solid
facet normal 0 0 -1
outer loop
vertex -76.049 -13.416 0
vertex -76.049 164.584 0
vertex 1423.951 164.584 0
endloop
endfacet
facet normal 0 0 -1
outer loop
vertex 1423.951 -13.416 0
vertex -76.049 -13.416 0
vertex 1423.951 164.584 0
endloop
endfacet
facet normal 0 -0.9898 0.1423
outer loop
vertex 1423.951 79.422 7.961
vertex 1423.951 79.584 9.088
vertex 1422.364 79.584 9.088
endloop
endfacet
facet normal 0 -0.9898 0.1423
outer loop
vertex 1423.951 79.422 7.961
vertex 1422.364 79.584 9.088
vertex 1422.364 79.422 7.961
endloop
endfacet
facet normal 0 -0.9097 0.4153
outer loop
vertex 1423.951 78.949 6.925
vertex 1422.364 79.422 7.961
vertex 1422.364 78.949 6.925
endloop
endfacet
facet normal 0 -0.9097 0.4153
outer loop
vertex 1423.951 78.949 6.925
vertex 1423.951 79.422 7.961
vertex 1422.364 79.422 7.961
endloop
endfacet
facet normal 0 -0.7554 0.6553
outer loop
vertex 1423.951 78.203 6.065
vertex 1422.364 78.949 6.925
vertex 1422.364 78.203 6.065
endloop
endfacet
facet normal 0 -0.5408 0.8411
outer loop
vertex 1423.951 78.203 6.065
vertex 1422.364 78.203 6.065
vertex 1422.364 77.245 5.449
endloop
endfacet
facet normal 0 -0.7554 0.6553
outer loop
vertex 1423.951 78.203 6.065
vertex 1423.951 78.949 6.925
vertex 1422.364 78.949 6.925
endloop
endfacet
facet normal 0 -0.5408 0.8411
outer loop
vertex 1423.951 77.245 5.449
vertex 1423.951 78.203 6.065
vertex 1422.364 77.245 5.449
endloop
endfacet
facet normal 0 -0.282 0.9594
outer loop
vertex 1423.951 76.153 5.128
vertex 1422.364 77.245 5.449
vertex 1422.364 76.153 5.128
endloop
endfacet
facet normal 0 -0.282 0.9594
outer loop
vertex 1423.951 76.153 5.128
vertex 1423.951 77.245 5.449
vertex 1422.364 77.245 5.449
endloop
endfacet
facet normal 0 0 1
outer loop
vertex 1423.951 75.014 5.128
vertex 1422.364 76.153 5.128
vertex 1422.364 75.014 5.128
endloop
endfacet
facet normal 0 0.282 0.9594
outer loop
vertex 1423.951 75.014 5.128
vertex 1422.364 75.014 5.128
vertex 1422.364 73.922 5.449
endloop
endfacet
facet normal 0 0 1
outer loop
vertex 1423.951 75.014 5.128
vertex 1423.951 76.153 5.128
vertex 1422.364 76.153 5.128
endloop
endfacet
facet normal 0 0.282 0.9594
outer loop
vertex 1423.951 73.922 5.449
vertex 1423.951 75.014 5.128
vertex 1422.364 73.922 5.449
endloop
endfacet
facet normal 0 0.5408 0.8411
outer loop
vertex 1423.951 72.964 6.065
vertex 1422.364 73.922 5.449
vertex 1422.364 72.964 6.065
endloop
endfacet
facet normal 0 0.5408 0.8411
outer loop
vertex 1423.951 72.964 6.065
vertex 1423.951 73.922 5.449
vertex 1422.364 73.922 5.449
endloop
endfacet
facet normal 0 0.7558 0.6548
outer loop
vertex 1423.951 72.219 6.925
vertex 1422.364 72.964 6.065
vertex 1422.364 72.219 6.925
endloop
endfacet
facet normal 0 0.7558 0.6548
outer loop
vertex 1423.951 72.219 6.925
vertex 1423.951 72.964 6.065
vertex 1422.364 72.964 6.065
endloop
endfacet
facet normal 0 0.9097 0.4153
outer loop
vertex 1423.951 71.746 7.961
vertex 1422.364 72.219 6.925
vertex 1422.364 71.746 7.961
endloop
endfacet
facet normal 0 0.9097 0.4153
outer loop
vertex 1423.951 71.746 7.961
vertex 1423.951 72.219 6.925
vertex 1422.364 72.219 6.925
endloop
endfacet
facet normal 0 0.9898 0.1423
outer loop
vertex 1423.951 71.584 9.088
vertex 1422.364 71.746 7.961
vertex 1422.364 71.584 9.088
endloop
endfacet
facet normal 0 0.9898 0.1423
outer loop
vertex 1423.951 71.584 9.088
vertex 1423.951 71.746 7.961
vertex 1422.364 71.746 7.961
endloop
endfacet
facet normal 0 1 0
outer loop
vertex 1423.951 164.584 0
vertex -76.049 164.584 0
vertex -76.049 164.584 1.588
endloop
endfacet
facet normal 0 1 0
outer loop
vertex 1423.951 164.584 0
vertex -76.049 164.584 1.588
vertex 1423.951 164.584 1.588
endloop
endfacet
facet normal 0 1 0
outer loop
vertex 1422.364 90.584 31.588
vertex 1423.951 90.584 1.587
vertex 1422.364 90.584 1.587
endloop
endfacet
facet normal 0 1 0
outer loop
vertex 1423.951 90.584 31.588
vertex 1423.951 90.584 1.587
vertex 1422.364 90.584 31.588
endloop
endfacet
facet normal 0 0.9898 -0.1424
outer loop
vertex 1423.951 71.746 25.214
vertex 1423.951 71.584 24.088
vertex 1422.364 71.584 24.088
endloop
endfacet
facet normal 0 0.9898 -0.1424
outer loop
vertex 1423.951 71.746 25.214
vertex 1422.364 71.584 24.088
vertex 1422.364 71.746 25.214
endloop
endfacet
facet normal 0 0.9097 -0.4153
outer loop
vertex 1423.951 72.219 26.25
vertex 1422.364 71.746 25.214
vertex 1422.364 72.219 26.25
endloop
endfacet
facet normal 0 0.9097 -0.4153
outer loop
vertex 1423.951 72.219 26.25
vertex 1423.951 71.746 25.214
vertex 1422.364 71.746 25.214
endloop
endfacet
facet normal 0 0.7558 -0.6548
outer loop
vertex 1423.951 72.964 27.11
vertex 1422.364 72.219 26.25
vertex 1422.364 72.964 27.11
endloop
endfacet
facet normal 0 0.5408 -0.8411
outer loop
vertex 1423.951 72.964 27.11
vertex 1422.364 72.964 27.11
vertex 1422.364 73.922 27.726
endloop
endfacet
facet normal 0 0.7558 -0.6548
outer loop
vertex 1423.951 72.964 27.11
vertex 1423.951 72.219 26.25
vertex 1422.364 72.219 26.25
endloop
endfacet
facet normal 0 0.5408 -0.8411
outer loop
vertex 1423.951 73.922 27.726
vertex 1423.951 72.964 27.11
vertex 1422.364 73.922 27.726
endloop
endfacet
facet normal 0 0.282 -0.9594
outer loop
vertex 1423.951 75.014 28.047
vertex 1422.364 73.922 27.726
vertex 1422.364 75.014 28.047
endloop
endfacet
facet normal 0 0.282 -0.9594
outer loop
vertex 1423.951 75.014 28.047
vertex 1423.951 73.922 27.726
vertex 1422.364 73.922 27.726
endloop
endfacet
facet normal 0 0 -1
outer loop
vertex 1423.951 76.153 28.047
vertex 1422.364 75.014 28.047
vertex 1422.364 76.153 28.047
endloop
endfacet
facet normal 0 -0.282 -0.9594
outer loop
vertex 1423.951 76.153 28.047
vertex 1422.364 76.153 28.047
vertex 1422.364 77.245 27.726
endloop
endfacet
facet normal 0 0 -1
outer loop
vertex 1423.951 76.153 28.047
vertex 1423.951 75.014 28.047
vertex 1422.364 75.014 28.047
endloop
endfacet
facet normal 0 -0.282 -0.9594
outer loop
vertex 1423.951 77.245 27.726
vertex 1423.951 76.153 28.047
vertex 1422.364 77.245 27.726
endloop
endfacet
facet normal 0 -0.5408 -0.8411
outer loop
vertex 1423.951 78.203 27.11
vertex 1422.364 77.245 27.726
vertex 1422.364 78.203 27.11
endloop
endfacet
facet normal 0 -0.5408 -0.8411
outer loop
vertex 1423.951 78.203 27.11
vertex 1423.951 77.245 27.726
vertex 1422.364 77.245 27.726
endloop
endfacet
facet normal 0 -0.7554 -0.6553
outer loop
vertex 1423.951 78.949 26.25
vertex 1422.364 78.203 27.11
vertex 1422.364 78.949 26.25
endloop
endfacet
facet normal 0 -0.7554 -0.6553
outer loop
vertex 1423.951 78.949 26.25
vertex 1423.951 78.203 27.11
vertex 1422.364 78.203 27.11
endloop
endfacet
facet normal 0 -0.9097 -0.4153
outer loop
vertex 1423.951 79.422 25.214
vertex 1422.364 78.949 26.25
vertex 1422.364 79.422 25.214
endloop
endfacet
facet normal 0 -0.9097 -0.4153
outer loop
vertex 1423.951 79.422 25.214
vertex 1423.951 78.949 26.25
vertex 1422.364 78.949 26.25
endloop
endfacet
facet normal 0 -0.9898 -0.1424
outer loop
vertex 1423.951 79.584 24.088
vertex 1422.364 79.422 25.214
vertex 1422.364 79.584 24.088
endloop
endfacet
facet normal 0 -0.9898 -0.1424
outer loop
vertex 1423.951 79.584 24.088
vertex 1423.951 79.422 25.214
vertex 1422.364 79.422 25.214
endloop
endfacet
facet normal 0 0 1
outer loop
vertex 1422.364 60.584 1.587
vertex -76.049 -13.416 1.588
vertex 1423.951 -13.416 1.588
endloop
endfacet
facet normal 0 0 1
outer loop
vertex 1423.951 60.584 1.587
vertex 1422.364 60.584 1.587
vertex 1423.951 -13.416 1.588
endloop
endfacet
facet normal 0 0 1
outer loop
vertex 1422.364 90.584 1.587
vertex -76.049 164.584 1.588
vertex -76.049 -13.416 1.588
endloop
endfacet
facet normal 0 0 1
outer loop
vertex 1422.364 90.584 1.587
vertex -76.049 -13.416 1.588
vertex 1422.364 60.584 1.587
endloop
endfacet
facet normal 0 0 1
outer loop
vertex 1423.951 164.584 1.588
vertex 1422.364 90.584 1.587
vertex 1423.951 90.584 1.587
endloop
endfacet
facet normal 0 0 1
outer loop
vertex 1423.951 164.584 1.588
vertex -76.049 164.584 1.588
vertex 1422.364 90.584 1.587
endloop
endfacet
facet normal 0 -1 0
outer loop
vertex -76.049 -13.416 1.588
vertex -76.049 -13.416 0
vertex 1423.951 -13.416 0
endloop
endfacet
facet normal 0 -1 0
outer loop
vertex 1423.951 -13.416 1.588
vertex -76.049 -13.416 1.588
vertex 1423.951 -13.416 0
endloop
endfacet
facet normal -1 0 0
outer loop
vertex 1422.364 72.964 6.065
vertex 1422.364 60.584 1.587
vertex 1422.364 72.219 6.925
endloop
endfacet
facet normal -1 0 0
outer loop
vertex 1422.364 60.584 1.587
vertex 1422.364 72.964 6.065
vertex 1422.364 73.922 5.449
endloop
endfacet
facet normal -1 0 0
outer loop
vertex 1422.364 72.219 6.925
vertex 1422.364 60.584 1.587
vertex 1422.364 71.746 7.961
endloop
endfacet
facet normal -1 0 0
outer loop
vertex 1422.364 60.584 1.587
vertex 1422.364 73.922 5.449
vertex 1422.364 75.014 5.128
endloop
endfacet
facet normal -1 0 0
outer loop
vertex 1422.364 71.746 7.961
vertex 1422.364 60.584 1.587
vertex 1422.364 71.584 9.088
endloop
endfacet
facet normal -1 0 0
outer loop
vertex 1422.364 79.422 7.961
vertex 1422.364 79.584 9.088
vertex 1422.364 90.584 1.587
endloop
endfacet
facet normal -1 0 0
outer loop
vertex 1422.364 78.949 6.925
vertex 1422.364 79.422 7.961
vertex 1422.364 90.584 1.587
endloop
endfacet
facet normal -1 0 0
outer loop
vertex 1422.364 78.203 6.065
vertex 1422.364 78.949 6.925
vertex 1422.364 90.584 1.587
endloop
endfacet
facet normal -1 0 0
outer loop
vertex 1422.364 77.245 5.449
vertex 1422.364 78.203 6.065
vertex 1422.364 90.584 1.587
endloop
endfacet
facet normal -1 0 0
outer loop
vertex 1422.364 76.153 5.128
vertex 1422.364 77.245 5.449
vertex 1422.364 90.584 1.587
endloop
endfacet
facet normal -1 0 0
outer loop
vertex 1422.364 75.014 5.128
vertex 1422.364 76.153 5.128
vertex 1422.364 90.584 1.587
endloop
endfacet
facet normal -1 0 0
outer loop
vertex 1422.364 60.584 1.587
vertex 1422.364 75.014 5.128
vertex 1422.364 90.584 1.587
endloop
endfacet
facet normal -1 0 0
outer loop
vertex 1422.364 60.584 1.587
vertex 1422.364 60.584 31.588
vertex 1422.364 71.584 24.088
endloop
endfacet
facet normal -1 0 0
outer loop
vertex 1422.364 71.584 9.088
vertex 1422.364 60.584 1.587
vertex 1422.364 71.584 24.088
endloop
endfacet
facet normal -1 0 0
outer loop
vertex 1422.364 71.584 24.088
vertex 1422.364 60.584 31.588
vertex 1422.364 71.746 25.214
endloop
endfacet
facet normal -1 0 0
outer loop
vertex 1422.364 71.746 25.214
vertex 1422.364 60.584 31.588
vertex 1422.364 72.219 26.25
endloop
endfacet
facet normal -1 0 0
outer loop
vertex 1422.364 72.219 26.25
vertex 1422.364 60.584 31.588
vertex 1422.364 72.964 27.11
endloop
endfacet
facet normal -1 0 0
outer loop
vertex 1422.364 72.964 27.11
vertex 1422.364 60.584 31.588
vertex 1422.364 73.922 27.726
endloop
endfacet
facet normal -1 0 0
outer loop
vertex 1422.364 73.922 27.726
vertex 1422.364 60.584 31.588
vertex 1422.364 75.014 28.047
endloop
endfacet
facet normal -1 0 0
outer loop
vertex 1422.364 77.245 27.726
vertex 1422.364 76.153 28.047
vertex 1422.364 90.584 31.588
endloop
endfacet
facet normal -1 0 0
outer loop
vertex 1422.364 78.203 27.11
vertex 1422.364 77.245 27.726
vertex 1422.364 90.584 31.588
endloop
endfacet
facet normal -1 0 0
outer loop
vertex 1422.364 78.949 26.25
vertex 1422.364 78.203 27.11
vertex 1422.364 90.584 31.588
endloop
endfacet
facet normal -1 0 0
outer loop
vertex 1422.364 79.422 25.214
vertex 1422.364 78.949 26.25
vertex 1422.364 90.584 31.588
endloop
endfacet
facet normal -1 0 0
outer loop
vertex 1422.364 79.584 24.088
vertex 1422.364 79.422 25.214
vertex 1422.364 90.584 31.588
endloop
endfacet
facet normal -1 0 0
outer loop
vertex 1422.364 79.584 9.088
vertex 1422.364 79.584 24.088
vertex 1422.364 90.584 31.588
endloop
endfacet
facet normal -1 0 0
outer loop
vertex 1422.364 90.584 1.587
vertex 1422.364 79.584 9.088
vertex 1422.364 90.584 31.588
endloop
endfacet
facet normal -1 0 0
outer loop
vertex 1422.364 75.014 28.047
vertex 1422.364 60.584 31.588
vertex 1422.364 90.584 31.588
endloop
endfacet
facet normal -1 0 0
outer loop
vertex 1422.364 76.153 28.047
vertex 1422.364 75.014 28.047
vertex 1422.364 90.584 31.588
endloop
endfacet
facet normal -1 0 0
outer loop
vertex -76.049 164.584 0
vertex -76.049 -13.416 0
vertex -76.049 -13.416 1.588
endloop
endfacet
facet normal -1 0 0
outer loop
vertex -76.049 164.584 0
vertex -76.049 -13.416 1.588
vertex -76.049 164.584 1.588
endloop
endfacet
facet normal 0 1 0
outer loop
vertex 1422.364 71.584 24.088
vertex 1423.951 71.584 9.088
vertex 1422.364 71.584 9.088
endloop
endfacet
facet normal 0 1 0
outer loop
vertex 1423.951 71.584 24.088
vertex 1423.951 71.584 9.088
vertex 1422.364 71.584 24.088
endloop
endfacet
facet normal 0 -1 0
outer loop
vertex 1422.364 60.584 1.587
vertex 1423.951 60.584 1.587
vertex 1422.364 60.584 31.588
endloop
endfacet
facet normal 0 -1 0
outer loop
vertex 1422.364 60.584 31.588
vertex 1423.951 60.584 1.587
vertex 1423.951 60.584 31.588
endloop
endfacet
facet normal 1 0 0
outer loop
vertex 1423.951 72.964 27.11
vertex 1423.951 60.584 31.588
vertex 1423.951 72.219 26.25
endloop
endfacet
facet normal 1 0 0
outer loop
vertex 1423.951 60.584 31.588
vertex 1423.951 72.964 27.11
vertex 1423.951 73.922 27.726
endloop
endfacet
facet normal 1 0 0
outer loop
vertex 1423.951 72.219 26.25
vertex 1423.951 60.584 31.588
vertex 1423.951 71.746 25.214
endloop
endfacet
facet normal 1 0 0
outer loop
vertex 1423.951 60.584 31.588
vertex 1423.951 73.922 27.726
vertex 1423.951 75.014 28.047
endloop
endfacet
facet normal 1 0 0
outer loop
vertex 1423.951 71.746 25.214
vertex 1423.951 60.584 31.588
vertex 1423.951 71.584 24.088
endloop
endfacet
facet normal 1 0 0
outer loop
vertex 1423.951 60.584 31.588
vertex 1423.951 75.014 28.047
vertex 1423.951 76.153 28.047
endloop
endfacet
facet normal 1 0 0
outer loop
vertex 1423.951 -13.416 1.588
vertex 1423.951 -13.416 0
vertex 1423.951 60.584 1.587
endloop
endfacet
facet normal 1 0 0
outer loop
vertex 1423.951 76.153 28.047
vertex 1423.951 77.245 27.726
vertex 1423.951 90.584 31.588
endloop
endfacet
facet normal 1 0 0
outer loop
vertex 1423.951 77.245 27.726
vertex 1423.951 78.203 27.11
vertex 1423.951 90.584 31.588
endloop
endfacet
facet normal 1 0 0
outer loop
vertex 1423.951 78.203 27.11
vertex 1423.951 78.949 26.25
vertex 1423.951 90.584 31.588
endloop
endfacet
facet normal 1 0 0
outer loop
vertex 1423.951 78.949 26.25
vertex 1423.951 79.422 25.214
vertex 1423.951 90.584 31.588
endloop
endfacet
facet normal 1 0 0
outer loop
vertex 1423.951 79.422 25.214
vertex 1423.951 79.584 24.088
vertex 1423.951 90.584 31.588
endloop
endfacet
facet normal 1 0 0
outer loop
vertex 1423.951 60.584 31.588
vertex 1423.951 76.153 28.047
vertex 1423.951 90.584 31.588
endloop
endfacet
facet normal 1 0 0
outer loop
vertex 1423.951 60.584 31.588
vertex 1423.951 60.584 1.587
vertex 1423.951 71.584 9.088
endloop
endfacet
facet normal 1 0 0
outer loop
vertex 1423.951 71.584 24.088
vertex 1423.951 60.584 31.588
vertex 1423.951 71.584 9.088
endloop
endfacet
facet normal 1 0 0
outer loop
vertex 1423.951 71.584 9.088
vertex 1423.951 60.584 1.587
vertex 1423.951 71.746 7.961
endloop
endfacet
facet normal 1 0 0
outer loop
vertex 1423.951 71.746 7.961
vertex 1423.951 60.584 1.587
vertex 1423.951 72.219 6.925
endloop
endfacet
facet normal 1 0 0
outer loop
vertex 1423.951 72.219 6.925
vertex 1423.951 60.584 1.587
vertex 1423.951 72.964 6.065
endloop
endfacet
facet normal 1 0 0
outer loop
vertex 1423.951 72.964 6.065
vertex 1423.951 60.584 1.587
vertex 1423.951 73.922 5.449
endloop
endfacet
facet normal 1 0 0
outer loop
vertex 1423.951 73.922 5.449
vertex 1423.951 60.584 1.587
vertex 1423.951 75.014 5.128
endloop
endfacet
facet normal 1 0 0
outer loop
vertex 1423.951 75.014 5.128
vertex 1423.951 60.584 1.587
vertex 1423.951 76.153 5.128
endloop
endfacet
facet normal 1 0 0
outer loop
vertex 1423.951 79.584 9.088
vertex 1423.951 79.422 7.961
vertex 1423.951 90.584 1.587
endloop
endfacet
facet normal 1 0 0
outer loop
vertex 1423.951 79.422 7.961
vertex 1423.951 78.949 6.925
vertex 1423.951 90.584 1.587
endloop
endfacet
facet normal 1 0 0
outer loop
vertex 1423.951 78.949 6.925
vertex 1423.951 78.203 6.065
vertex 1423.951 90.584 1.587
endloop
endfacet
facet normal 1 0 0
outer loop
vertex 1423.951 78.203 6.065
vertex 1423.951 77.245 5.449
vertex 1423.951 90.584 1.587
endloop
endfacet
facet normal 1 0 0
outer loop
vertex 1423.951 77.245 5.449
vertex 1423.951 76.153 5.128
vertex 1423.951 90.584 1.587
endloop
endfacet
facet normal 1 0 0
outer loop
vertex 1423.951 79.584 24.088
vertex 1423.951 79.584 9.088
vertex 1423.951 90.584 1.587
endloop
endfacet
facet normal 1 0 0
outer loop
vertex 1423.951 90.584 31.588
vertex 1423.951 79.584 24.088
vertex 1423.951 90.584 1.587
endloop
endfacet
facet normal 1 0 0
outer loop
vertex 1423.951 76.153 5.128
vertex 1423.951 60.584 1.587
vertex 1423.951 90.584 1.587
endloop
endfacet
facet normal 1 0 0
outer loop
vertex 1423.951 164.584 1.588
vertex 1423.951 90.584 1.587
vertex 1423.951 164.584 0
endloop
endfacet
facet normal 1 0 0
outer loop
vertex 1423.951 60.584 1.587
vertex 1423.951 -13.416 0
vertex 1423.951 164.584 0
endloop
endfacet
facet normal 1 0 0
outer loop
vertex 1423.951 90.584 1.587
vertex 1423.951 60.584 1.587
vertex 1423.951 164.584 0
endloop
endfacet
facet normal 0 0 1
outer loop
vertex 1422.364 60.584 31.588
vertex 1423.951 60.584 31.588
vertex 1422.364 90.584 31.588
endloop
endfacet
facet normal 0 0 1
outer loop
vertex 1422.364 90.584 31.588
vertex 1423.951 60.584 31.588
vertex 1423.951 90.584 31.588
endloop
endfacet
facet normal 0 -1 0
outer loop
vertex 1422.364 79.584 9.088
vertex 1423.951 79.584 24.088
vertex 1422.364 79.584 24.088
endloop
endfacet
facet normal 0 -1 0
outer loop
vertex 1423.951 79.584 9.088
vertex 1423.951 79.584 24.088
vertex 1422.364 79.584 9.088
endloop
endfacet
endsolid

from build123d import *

# Parameters (mm, degrees)
F0_W     = 1500
F0_H     = 178
F1_DEPTH = 1.5875
F2_W     = 30
F2_H     = 30
F3_DEPTH = 1.5875


# Not quite as in the source:
# - a length typed as a fraction of an inch, garbled in the dataset ("3 / 203.2 mm" for 3/8 in), is restored


with BuildPart() as f1:
    # F0 (on Top) → F1 (new body)
    with BuildSketch(Plane.XY):
        with Locations((673.9510029554, 75.5837445271)):
            Rectangle(F0_W, F0_H)
    extrude(amount=F1_DEPTH)

    # F2 (on face) → F3 (join)
    with BuildSketch(Plane.YZ.offset(1423.9510029554)):
        with Locations((75.5837445271, 16.5875)):
            Rectangle(F2_W, F2_H)
        with BuildLine():
            ThreePointArc((71.5837445271, 24.0875), (75.5837445271, 28.0875), (79.5837445271, 24.0875))
            Line((79.5837445271, 24.0875), (79.5837445271, 9.0875))
            ThreePointArc((79.5837445271, 9.0875), (75.5837445271, 5.0875), (71.5837445271, 9.0875))
            Line((71.5837445271, 9.0875), (71.5837445271, 24.0875))
        make_face(mode=Mode.SUBTRACT)
    extrude(amount=-F3_DEPTH)


solid = f1.part
